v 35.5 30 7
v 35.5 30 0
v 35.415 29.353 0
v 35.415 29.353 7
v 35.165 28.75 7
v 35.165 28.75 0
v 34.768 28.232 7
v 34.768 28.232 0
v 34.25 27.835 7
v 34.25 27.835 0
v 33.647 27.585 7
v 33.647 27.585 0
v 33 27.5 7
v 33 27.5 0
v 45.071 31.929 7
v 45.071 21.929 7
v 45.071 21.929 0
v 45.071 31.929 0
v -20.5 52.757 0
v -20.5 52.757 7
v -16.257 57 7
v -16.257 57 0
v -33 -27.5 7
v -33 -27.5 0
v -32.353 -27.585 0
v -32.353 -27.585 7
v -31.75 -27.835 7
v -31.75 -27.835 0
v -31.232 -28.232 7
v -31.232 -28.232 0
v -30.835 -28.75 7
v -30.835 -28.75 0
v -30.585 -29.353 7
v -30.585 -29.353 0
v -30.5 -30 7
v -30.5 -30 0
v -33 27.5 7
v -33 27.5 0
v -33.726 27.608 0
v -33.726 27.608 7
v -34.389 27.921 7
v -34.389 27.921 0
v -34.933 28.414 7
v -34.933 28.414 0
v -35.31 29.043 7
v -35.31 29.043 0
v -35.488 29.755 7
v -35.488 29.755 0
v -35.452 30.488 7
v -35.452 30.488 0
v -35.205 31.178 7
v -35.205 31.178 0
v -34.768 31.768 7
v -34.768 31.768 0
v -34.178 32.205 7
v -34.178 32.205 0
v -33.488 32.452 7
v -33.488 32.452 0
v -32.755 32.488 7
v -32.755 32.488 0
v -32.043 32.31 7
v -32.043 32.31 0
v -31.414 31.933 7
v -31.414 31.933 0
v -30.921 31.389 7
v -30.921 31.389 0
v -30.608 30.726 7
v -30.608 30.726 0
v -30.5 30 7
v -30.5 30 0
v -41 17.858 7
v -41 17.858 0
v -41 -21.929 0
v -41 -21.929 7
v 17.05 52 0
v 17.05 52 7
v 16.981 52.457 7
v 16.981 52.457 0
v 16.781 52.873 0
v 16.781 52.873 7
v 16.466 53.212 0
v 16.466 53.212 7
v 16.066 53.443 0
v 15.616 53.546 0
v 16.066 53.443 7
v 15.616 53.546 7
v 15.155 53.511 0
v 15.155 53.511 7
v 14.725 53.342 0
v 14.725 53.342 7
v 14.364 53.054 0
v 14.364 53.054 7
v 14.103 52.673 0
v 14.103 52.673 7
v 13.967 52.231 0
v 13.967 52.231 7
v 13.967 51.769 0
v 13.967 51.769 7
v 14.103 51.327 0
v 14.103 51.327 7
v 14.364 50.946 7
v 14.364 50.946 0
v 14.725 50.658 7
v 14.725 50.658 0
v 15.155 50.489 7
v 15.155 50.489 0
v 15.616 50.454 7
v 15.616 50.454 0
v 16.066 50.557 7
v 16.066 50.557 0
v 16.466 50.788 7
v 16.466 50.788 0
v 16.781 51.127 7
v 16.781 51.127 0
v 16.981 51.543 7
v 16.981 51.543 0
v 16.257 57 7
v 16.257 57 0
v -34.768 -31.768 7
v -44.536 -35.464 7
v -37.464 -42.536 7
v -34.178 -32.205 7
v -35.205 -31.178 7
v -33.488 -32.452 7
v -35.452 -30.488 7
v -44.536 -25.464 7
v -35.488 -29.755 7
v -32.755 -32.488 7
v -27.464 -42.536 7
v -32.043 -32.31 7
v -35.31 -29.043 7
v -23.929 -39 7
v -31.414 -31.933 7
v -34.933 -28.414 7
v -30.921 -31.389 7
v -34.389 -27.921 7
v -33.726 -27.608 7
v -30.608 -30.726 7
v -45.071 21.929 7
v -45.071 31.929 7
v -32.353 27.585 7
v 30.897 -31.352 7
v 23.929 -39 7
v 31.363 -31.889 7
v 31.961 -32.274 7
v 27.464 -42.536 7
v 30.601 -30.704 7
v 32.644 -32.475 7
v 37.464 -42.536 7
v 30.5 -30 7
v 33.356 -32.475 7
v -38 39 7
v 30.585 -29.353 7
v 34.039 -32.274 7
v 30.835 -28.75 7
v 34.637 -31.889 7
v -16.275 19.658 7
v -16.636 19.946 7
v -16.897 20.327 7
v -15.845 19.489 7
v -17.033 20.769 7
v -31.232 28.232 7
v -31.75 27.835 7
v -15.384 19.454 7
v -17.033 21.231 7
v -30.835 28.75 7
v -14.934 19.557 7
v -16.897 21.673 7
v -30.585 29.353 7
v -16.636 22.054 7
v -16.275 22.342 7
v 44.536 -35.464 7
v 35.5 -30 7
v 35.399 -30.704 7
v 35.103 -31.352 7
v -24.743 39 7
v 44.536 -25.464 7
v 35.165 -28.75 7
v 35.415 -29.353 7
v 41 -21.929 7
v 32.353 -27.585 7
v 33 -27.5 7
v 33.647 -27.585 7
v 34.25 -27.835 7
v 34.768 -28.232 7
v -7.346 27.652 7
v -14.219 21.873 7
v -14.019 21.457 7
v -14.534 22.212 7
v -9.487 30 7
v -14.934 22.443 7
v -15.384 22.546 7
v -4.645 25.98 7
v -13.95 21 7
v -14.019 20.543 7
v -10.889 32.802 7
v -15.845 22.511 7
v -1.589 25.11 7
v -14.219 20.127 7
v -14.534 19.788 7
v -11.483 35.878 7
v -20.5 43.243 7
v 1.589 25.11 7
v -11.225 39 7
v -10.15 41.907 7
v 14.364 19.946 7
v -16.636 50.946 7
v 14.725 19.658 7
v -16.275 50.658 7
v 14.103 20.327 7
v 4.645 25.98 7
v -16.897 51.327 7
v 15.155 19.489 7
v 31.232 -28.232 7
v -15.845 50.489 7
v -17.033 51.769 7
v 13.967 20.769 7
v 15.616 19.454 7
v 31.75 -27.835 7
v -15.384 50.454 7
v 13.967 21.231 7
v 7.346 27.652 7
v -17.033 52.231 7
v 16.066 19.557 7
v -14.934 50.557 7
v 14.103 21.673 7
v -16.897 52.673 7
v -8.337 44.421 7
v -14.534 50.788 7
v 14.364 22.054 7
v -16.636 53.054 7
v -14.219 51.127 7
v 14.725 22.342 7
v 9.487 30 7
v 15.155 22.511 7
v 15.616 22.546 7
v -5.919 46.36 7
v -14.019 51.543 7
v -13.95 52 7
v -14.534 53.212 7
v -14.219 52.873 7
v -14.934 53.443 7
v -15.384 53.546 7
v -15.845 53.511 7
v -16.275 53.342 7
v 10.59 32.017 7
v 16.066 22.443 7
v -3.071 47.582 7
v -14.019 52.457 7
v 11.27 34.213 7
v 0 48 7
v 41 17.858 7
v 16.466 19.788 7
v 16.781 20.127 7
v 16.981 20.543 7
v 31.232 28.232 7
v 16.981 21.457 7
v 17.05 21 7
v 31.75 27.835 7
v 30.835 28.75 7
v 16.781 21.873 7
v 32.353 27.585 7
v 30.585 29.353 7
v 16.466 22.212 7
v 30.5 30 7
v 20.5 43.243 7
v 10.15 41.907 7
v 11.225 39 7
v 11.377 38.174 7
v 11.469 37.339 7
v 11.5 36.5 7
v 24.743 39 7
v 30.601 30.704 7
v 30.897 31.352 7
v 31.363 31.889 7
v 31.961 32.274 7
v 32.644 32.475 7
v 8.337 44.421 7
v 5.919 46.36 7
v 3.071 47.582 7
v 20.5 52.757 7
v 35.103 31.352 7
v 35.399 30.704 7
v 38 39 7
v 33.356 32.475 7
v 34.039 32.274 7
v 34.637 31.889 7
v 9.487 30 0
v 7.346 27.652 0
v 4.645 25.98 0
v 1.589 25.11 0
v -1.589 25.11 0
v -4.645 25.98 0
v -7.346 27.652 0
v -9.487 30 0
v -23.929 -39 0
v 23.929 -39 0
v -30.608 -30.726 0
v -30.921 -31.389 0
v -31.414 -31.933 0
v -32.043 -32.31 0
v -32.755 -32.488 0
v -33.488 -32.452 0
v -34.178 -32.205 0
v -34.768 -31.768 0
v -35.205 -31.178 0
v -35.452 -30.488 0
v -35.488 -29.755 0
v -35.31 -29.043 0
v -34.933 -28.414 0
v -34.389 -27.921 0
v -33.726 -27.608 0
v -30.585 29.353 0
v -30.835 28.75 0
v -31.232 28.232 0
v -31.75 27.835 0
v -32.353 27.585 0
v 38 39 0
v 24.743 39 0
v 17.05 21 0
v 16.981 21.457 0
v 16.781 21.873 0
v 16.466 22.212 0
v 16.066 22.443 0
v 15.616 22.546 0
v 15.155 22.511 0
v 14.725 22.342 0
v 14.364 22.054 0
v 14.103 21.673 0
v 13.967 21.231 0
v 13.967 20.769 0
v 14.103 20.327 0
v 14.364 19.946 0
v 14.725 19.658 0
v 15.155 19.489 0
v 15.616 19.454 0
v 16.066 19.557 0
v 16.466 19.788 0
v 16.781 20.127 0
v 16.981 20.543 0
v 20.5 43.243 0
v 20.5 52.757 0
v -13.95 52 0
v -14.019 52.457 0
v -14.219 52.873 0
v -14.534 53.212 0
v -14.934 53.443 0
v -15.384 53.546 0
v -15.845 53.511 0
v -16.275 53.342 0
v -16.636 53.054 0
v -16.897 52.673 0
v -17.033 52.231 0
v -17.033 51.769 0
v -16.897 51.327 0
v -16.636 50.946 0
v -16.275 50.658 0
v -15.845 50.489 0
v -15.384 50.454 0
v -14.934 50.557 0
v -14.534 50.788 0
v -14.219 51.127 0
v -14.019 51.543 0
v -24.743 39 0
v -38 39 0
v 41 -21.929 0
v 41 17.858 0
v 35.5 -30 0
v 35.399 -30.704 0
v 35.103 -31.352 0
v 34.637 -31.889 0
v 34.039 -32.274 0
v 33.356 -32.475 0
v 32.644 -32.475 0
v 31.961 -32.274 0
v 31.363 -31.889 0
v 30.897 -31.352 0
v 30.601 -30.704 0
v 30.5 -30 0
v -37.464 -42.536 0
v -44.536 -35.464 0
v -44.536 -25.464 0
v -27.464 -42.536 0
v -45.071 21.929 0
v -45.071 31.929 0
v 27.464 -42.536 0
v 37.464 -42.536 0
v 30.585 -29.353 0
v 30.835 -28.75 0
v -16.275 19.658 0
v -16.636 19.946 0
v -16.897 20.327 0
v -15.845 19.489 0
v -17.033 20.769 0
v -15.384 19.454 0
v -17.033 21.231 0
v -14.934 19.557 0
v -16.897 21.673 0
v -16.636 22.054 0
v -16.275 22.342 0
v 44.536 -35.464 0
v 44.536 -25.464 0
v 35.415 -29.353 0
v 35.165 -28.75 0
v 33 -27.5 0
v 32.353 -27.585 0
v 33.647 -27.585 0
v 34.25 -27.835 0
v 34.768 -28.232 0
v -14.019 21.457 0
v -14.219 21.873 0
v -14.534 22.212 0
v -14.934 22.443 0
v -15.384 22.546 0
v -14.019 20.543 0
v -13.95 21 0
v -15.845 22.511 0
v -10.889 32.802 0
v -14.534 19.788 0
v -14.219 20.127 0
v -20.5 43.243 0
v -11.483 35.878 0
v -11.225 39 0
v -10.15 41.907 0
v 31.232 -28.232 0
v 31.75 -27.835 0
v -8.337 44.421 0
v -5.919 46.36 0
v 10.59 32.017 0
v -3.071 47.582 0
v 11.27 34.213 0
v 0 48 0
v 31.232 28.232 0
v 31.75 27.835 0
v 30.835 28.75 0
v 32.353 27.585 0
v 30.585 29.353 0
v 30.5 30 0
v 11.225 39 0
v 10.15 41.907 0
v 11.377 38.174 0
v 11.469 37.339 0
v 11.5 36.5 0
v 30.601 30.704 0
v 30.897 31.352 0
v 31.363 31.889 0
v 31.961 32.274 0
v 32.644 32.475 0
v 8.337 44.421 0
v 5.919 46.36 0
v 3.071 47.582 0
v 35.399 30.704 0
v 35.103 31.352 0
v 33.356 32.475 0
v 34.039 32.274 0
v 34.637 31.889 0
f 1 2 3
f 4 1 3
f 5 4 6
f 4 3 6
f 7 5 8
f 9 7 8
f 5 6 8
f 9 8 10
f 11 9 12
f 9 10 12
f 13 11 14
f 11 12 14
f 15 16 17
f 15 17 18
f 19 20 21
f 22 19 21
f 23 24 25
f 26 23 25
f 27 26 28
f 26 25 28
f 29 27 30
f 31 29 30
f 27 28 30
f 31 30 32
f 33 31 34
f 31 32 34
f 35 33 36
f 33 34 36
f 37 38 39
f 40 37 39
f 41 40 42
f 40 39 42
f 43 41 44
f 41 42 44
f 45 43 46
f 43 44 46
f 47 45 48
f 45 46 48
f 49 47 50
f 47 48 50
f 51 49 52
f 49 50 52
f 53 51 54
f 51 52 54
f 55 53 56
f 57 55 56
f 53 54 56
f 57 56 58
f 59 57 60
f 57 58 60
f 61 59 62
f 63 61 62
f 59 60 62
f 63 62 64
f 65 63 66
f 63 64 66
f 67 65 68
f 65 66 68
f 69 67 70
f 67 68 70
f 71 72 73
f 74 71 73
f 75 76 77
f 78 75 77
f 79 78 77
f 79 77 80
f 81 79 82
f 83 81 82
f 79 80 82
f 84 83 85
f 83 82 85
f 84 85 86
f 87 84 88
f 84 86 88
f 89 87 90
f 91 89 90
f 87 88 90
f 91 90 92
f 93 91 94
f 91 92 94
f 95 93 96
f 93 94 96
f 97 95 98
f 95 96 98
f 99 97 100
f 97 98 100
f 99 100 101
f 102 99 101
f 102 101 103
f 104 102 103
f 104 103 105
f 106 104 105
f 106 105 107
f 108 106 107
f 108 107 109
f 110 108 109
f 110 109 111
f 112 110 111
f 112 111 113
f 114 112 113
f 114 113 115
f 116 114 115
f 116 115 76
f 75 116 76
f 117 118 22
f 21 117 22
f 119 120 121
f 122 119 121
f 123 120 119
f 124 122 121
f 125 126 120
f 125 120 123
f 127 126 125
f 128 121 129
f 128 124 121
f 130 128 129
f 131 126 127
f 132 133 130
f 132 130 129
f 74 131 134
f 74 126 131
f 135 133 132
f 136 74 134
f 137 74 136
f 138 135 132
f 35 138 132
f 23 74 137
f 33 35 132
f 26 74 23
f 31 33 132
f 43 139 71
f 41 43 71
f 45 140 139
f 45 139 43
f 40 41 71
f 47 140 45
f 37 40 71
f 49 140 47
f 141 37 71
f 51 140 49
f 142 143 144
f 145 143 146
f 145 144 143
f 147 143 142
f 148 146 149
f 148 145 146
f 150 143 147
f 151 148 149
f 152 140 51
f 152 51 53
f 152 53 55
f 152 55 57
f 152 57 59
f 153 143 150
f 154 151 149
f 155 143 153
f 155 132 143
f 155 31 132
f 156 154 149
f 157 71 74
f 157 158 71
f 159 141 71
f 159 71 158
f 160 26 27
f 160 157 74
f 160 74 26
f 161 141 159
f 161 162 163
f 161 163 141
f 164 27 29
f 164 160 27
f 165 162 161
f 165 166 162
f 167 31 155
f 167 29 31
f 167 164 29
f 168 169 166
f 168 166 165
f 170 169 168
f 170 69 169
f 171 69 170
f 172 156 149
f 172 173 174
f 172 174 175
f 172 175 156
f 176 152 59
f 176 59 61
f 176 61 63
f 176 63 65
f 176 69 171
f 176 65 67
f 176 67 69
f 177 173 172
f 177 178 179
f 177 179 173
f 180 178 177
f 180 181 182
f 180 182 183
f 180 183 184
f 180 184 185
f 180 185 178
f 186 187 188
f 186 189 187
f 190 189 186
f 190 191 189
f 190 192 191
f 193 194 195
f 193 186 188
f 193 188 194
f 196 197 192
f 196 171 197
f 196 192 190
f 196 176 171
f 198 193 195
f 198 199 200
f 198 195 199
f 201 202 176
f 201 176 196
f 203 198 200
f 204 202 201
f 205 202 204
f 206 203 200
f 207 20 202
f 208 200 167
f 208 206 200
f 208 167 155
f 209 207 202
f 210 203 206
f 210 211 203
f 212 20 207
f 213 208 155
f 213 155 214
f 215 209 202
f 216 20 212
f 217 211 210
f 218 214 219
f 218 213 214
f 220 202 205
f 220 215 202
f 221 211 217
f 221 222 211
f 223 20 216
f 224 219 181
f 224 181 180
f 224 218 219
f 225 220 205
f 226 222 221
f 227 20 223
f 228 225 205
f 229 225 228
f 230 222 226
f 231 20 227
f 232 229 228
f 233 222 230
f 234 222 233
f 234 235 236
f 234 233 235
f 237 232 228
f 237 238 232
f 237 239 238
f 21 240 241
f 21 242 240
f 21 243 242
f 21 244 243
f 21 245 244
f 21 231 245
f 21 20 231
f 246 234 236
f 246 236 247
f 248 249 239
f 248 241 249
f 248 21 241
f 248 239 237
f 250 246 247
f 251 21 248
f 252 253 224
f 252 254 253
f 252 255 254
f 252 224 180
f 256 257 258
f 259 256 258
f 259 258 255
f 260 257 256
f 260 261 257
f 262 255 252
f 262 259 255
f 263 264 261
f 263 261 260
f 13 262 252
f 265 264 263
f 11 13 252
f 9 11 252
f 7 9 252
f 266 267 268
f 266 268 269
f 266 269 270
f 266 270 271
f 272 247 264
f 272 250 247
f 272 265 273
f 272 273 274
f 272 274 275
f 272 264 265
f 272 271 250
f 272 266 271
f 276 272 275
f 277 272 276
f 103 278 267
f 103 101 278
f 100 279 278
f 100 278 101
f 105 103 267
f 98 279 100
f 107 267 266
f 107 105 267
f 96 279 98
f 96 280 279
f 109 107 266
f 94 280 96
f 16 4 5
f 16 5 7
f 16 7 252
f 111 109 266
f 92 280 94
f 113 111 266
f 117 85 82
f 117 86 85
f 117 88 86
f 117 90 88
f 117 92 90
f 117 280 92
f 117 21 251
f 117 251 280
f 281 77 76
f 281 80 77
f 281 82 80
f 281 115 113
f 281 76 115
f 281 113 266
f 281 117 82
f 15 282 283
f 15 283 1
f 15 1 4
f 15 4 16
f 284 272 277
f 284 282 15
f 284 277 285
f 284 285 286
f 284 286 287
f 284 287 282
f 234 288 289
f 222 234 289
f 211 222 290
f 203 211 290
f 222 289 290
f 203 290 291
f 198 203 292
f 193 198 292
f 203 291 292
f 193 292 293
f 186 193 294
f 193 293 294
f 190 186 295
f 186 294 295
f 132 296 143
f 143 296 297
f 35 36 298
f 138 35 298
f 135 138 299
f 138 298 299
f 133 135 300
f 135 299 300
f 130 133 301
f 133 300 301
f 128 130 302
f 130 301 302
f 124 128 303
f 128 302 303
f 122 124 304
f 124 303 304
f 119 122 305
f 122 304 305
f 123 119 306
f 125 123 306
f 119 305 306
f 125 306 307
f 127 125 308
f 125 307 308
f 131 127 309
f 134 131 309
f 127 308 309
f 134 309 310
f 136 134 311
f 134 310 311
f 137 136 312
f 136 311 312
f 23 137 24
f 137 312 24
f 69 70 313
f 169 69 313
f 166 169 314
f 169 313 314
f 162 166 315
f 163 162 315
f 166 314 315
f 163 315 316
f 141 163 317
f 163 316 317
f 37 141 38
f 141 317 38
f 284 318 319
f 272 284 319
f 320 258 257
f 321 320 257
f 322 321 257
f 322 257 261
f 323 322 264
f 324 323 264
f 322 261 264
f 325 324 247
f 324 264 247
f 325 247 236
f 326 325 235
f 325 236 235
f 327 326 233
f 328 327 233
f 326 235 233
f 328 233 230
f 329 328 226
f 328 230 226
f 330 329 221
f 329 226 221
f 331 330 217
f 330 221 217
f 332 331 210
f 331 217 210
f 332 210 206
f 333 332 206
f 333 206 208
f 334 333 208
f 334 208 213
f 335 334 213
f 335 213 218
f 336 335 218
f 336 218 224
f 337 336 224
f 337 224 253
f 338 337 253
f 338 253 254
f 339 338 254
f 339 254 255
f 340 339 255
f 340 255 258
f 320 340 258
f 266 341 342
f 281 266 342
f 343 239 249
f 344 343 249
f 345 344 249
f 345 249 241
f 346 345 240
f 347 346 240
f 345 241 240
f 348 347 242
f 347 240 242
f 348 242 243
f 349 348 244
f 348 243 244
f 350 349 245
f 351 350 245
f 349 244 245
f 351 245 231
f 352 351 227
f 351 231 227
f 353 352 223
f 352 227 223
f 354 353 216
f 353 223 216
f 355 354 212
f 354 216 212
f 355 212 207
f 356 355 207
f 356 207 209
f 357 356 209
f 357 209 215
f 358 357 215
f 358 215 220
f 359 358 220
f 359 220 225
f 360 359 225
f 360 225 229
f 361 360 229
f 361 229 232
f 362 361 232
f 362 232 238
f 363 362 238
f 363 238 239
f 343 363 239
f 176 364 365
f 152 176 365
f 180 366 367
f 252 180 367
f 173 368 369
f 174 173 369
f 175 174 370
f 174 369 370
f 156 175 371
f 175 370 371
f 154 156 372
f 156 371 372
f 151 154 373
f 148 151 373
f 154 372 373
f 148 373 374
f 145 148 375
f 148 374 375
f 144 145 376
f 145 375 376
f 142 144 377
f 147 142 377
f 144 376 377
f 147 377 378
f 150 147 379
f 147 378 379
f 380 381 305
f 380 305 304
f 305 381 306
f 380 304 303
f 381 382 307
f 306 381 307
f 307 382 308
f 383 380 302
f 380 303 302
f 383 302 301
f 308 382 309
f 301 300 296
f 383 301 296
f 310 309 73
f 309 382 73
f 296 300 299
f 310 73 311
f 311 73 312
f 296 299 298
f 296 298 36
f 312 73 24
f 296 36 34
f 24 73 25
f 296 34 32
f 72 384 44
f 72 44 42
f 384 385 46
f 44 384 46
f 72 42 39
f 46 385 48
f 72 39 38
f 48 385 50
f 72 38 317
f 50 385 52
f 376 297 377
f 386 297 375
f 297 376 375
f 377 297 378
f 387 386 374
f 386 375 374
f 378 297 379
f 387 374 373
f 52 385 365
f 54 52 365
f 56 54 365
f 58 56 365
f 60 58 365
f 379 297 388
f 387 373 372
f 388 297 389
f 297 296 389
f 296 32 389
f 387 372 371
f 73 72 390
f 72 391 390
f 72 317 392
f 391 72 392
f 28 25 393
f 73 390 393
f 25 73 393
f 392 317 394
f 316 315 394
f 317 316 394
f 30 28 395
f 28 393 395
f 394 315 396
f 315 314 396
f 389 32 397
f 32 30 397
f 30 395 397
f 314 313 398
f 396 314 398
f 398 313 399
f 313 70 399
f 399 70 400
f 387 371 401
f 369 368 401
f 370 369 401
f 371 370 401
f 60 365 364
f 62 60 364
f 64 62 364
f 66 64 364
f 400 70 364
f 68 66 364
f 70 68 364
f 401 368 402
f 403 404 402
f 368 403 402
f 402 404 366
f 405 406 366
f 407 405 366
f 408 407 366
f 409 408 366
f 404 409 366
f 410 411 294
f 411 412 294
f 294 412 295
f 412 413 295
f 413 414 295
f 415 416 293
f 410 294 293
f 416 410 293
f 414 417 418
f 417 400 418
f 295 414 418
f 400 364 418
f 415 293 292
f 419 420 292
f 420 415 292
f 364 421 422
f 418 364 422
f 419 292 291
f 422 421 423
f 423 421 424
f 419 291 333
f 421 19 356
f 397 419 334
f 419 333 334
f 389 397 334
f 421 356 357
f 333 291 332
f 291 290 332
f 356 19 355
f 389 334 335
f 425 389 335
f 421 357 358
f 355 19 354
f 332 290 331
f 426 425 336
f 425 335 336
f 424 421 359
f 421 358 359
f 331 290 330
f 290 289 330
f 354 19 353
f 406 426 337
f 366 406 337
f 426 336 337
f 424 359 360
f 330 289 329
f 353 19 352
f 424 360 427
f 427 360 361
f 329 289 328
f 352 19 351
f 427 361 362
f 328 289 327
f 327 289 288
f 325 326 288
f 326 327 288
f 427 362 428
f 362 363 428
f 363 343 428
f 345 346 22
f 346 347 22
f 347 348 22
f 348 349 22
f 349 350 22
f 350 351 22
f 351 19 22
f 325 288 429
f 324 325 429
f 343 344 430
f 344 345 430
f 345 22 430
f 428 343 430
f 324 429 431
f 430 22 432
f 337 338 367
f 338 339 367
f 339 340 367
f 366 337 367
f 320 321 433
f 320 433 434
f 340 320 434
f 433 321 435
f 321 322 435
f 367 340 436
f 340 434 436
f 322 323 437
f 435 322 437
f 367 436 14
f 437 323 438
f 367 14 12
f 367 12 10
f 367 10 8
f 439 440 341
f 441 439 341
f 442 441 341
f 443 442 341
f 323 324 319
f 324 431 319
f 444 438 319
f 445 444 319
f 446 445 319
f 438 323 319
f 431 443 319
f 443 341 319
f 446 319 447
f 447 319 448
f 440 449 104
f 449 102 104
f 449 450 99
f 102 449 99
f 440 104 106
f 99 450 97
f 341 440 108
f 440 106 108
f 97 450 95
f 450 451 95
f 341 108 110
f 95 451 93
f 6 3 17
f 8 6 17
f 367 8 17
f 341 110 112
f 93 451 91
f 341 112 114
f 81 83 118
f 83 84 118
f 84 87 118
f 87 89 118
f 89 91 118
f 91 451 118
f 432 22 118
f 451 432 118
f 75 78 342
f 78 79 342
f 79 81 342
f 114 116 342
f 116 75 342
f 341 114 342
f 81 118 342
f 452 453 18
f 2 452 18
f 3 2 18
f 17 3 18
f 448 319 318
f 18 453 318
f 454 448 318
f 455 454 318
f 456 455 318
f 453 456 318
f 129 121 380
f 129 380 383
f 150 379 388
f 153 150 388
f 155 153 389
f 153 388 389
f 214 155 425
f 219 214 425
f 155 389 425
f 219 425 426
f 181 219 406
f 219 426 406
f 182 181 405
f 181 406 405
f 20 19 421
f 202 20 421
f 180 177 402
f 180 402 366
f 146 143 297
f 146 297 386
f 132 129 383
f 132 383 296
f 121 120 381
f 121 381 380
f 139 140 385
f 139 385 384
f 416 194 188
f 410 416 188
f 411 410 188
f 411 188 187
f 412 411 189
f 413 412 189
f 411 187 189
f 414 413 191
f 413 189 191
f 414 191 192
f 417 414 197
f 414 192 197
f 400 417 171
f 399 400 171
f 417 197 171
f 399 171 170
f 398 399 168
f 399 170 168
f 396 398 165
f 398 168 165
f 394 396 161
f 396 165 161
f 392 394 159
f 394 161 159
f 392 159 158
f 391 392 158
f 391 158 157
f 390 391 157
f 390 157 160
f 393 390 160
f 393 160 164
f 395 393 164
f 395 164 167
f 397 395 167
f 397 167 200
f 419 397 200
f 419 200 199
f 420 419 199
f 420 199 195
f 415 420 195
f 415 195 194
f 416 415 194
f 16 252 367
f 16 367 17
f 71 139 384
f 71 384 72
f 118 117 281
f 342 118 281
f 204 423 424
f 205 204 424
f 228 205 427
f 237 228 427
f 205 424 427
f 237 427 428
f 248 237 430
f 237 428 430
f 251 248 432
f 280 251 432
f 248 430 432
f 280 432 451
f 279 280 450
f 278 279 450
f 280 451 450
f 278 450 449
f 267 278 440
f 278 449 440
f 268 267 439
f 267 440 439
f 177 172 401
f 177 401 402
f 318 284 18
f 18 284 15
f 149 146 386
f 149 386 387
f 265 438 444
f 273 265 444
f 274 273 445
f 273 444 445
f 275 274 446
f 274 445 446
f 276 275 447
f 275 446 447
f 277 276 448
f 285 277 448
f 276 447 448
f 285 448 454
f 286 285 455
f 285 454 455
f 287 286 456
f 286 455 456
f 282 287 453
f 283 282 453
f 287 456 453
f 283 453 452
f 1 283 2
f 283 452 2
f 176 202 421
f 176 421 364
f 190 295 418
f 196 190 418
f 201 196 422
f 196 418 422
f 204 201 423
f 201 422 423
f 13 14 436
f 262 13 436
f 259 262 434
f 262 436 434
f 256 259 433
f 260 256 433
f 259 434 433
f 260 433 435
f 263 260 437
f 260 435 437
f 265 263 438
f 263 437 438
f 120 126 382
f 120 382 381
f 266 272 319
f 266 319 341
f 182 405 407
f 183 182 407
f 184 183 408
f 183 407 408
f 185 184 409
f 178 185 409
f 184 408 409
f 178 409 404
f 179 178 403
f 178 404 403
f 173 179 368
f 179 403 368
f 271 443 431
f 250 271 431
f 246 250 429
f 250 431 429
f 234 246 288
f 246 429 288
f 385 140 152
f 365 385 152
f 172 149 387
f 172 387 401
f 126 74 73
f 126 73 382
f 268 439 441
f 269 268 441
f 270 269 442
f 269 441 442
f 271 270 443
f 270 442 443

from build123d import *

# Parameters (mm, degrees)
SALIENTE_EXTRUIR5_DEPTH = 7
CROQUIS5_R              = 1.55
CORTAR_EXTRUIR1_DEPTH   = 71.562029449
SALIENTE_EXTRUIR7_DEPTH = 7
CORTAR_EXTRUIR2_DEPTH   = 74.002747576


with BuildPart() as part:
    # Croquis1 → Saliente-Extruir5 (new body)
    with BuildSketch(Plane.XY):
        with BuildLine():
            Line((-20.5, 30), (-30.5, 30))
            ThreePointArc((-30.5, 30), (-31.232233047, 28.232233047), (-33, 27.5))
            Line((-33, 27.5), (-33, -27.5))
            ThreePointArc((-33, -27.5), (-31.232233047, -28.232233047), (-30.5, -30))
            Line((-30.5, -30), (30.5, -30))
            ThreePointArc((30.5, -30), (31.232233047, -28.232233047), (33, -27.5))
            Line((33, -27.5), (33, 27.5))
            ThreePointArc((33, 27.5), (31.232233047, 28.232233047), (30.5, 30))
            Line((30.5, 30), (20.5, 30))
            Line((20.5, 30), (20.5, 16))
            Line((20.5, 16), (-20.5, 16))
            Line((-20.5, 16), (-20.5, 30))
        make_face()
        with BuildLine():
            Line((-9.486832981, 30), (-20.5, 30))
            Line((-20.5, 30), (-20.5, 16))
            Line((-20.5, 16), (20.5, 16))
            Line((20.5, 16), (20.5, 30))
            Line((20.5, 30), (9.486832981, 30))
            ThreePointArc((9.486832981, 30), (0, 25), (-9.486832981, 30))
        make_face()
        with BuildLine():
            ThreePointArc((-33, 27.5), (-34.767766953, 31.767766953), (-30.5, 30))
            Line((-30.5, 30), (-20.5, 30))
            Line((-20.5, 30), (-20.5, 39))
            Line((-20.5, 39), (-41, 39))
            Line((-41, 39), (-41, -39))
            Line((-41, -39), (41, -39))
            Line((41, -39), (41, 39))
            Line((41, 39), (20.5, 39))
            Line((20.5, 39), (20.5, 30))
            Line((20.5, 30), (30.5, 30))
            ThreePointArc((30.5, 30), (33, 32.5), (35.5, 30))
            ThreePointArc((35.5, 30), (34.767766953, 28.232233047), (33, 27.5))
            Line((33, 27.5), (33, -27.5))
            ThreePointArc((33, -27.5), (34.767766953, -28.232233047), (35.5, -30))
            ThreePointArc((35.5, -30), (33, -32.5), (30.5, -30))
            Line((30.5, -30), (-30.5, -30))
            ThreePointArc((-30.5, -30), (-34.767766953, -31.767766953), (-33, -27.5))
            Line((-33, -27.5), (-33, 27.5))
        make_face()
        with BuildLine():
            Line((-20.5, 57), (-20.5, 39))
            Line((-20.5, 39), (-11.22497216, 39))
            ThreePointArc((-11.22497216, 39), (0, 48), (11.22497216, 39))
            Line((11.22497216, 39), (20.5, 39))
            Line((20.5, 39), (20.5, 57))
            Line((20.5, 57), (-20.5, 57))
        make_face()
        with BuildLine():
            Line((-20.5, 39), (-20.5, 30))
            Line((-20.5, 30), (-9.486832981, 30))
            ThreePointArc((-9.486832981, 30), (-11.291355899, 34.319339102), (-11.22497216, 39))
            Line((-11.22497216, 39), (-20.5, 39))
        make_face()
        with BuildLine():
            ThreePointArc((11.5, 36.5), (10.985185007, 33.097690437), (9.486832981, 30))
            Line((9.486832981, 30), (20.5, 30))
            Line((20.5, 30), (20.5, 39))
            Line((20.5, 39), (11.22497216, 39))
            ThreePointArc((11.22497216, 39), (11.431036258, 37.757541283), (11.5, 36.5))
        make_face()
    extrude(amount=SALIENTE_EXTRUIR5_DEPTH)

    # Croquis5 → Cortar-Extruir1 (cut, through all)
    with BuildSketch(Plane.XY.offset(7)):
        with Locations((-15.5, 52)):
            Circle(CROQUIS5_R)
        with Locations((15.5, 52)):
            Circle(CROQUIS5_R)
        with Locations((15.5, 21)):
            Circle(CROQUIS5_R)
        with Locations((-15.5, 21)):
            Circle(CROQUIS5_R)
    extrude(amount=-CORTAR_EXTRUIR1_DEPTH, mode=Mode.SUBTRACT)

    # Croquis6 → Saliente-Extruir7 (add, through all)
    with BuildSketch(Plane.XY.offset(7)):
        Polygon((-41, 17.857864376), (-41, 36), (-45.071067812, 31.928932188), (-45.071067812, 21.928932188), align=None)
        Polygon((-20.5, 43.242640687), (-24.742640687, 39), (-20.5, 39), align=None)
        Polygon((20.5, 43.242640687), (20.5, 39), (24.742640687, 39), align=None)
        Polygon((45.071067812, 31.928932188), (41, 36), (41, 17.857864376), (45.071067812, 21.928932188), align=None)
        Polygon((41, -21.928932188), (41, -39), (44.535533906, -35.464466094), (44.535533906, -25.464466094), align=None)
        Polygon((41, -39), (23.928932188, -39), (27.464466094, -42.535533906), (37.464466094, -42.535533906), align=None)
        Polygon((-41, -39), (-41, -21.928932188), (-44.535533906, -25.464466094), (-44.535533906, -35.464466094), align=None)
        Polygon((-23.928932188, -39), (-41, -39), (-37.464466094, -42.535533906), (-27.464466094, -42.535533906), align=None)
    extrude(amount=-SALIENTE_EXTRUIR7_DEPTH)

    # Croquis7 → Cortar-Extruir2 (cut, through all)
    with BuildSketch(Plane.XY.offset(7)):
        Polygon((-20.5, 52.757359313), (-16.257359313, 57), (-20.5, 57), align=None)
        Polygon((20.5, 57), (16.257359313, 57), (20.5, 52.757359313), align=None)
        Polygon((-41, 39), (-41, 36), (-38, 39), align=None)
        Polygon((38, 39), (41, 36), (41, 39), align=None)
    extrude(amount=-CORTAR_EXTRUIR2_DEPTH, mode=Mode.SUBTRACT)


solid = part.part
